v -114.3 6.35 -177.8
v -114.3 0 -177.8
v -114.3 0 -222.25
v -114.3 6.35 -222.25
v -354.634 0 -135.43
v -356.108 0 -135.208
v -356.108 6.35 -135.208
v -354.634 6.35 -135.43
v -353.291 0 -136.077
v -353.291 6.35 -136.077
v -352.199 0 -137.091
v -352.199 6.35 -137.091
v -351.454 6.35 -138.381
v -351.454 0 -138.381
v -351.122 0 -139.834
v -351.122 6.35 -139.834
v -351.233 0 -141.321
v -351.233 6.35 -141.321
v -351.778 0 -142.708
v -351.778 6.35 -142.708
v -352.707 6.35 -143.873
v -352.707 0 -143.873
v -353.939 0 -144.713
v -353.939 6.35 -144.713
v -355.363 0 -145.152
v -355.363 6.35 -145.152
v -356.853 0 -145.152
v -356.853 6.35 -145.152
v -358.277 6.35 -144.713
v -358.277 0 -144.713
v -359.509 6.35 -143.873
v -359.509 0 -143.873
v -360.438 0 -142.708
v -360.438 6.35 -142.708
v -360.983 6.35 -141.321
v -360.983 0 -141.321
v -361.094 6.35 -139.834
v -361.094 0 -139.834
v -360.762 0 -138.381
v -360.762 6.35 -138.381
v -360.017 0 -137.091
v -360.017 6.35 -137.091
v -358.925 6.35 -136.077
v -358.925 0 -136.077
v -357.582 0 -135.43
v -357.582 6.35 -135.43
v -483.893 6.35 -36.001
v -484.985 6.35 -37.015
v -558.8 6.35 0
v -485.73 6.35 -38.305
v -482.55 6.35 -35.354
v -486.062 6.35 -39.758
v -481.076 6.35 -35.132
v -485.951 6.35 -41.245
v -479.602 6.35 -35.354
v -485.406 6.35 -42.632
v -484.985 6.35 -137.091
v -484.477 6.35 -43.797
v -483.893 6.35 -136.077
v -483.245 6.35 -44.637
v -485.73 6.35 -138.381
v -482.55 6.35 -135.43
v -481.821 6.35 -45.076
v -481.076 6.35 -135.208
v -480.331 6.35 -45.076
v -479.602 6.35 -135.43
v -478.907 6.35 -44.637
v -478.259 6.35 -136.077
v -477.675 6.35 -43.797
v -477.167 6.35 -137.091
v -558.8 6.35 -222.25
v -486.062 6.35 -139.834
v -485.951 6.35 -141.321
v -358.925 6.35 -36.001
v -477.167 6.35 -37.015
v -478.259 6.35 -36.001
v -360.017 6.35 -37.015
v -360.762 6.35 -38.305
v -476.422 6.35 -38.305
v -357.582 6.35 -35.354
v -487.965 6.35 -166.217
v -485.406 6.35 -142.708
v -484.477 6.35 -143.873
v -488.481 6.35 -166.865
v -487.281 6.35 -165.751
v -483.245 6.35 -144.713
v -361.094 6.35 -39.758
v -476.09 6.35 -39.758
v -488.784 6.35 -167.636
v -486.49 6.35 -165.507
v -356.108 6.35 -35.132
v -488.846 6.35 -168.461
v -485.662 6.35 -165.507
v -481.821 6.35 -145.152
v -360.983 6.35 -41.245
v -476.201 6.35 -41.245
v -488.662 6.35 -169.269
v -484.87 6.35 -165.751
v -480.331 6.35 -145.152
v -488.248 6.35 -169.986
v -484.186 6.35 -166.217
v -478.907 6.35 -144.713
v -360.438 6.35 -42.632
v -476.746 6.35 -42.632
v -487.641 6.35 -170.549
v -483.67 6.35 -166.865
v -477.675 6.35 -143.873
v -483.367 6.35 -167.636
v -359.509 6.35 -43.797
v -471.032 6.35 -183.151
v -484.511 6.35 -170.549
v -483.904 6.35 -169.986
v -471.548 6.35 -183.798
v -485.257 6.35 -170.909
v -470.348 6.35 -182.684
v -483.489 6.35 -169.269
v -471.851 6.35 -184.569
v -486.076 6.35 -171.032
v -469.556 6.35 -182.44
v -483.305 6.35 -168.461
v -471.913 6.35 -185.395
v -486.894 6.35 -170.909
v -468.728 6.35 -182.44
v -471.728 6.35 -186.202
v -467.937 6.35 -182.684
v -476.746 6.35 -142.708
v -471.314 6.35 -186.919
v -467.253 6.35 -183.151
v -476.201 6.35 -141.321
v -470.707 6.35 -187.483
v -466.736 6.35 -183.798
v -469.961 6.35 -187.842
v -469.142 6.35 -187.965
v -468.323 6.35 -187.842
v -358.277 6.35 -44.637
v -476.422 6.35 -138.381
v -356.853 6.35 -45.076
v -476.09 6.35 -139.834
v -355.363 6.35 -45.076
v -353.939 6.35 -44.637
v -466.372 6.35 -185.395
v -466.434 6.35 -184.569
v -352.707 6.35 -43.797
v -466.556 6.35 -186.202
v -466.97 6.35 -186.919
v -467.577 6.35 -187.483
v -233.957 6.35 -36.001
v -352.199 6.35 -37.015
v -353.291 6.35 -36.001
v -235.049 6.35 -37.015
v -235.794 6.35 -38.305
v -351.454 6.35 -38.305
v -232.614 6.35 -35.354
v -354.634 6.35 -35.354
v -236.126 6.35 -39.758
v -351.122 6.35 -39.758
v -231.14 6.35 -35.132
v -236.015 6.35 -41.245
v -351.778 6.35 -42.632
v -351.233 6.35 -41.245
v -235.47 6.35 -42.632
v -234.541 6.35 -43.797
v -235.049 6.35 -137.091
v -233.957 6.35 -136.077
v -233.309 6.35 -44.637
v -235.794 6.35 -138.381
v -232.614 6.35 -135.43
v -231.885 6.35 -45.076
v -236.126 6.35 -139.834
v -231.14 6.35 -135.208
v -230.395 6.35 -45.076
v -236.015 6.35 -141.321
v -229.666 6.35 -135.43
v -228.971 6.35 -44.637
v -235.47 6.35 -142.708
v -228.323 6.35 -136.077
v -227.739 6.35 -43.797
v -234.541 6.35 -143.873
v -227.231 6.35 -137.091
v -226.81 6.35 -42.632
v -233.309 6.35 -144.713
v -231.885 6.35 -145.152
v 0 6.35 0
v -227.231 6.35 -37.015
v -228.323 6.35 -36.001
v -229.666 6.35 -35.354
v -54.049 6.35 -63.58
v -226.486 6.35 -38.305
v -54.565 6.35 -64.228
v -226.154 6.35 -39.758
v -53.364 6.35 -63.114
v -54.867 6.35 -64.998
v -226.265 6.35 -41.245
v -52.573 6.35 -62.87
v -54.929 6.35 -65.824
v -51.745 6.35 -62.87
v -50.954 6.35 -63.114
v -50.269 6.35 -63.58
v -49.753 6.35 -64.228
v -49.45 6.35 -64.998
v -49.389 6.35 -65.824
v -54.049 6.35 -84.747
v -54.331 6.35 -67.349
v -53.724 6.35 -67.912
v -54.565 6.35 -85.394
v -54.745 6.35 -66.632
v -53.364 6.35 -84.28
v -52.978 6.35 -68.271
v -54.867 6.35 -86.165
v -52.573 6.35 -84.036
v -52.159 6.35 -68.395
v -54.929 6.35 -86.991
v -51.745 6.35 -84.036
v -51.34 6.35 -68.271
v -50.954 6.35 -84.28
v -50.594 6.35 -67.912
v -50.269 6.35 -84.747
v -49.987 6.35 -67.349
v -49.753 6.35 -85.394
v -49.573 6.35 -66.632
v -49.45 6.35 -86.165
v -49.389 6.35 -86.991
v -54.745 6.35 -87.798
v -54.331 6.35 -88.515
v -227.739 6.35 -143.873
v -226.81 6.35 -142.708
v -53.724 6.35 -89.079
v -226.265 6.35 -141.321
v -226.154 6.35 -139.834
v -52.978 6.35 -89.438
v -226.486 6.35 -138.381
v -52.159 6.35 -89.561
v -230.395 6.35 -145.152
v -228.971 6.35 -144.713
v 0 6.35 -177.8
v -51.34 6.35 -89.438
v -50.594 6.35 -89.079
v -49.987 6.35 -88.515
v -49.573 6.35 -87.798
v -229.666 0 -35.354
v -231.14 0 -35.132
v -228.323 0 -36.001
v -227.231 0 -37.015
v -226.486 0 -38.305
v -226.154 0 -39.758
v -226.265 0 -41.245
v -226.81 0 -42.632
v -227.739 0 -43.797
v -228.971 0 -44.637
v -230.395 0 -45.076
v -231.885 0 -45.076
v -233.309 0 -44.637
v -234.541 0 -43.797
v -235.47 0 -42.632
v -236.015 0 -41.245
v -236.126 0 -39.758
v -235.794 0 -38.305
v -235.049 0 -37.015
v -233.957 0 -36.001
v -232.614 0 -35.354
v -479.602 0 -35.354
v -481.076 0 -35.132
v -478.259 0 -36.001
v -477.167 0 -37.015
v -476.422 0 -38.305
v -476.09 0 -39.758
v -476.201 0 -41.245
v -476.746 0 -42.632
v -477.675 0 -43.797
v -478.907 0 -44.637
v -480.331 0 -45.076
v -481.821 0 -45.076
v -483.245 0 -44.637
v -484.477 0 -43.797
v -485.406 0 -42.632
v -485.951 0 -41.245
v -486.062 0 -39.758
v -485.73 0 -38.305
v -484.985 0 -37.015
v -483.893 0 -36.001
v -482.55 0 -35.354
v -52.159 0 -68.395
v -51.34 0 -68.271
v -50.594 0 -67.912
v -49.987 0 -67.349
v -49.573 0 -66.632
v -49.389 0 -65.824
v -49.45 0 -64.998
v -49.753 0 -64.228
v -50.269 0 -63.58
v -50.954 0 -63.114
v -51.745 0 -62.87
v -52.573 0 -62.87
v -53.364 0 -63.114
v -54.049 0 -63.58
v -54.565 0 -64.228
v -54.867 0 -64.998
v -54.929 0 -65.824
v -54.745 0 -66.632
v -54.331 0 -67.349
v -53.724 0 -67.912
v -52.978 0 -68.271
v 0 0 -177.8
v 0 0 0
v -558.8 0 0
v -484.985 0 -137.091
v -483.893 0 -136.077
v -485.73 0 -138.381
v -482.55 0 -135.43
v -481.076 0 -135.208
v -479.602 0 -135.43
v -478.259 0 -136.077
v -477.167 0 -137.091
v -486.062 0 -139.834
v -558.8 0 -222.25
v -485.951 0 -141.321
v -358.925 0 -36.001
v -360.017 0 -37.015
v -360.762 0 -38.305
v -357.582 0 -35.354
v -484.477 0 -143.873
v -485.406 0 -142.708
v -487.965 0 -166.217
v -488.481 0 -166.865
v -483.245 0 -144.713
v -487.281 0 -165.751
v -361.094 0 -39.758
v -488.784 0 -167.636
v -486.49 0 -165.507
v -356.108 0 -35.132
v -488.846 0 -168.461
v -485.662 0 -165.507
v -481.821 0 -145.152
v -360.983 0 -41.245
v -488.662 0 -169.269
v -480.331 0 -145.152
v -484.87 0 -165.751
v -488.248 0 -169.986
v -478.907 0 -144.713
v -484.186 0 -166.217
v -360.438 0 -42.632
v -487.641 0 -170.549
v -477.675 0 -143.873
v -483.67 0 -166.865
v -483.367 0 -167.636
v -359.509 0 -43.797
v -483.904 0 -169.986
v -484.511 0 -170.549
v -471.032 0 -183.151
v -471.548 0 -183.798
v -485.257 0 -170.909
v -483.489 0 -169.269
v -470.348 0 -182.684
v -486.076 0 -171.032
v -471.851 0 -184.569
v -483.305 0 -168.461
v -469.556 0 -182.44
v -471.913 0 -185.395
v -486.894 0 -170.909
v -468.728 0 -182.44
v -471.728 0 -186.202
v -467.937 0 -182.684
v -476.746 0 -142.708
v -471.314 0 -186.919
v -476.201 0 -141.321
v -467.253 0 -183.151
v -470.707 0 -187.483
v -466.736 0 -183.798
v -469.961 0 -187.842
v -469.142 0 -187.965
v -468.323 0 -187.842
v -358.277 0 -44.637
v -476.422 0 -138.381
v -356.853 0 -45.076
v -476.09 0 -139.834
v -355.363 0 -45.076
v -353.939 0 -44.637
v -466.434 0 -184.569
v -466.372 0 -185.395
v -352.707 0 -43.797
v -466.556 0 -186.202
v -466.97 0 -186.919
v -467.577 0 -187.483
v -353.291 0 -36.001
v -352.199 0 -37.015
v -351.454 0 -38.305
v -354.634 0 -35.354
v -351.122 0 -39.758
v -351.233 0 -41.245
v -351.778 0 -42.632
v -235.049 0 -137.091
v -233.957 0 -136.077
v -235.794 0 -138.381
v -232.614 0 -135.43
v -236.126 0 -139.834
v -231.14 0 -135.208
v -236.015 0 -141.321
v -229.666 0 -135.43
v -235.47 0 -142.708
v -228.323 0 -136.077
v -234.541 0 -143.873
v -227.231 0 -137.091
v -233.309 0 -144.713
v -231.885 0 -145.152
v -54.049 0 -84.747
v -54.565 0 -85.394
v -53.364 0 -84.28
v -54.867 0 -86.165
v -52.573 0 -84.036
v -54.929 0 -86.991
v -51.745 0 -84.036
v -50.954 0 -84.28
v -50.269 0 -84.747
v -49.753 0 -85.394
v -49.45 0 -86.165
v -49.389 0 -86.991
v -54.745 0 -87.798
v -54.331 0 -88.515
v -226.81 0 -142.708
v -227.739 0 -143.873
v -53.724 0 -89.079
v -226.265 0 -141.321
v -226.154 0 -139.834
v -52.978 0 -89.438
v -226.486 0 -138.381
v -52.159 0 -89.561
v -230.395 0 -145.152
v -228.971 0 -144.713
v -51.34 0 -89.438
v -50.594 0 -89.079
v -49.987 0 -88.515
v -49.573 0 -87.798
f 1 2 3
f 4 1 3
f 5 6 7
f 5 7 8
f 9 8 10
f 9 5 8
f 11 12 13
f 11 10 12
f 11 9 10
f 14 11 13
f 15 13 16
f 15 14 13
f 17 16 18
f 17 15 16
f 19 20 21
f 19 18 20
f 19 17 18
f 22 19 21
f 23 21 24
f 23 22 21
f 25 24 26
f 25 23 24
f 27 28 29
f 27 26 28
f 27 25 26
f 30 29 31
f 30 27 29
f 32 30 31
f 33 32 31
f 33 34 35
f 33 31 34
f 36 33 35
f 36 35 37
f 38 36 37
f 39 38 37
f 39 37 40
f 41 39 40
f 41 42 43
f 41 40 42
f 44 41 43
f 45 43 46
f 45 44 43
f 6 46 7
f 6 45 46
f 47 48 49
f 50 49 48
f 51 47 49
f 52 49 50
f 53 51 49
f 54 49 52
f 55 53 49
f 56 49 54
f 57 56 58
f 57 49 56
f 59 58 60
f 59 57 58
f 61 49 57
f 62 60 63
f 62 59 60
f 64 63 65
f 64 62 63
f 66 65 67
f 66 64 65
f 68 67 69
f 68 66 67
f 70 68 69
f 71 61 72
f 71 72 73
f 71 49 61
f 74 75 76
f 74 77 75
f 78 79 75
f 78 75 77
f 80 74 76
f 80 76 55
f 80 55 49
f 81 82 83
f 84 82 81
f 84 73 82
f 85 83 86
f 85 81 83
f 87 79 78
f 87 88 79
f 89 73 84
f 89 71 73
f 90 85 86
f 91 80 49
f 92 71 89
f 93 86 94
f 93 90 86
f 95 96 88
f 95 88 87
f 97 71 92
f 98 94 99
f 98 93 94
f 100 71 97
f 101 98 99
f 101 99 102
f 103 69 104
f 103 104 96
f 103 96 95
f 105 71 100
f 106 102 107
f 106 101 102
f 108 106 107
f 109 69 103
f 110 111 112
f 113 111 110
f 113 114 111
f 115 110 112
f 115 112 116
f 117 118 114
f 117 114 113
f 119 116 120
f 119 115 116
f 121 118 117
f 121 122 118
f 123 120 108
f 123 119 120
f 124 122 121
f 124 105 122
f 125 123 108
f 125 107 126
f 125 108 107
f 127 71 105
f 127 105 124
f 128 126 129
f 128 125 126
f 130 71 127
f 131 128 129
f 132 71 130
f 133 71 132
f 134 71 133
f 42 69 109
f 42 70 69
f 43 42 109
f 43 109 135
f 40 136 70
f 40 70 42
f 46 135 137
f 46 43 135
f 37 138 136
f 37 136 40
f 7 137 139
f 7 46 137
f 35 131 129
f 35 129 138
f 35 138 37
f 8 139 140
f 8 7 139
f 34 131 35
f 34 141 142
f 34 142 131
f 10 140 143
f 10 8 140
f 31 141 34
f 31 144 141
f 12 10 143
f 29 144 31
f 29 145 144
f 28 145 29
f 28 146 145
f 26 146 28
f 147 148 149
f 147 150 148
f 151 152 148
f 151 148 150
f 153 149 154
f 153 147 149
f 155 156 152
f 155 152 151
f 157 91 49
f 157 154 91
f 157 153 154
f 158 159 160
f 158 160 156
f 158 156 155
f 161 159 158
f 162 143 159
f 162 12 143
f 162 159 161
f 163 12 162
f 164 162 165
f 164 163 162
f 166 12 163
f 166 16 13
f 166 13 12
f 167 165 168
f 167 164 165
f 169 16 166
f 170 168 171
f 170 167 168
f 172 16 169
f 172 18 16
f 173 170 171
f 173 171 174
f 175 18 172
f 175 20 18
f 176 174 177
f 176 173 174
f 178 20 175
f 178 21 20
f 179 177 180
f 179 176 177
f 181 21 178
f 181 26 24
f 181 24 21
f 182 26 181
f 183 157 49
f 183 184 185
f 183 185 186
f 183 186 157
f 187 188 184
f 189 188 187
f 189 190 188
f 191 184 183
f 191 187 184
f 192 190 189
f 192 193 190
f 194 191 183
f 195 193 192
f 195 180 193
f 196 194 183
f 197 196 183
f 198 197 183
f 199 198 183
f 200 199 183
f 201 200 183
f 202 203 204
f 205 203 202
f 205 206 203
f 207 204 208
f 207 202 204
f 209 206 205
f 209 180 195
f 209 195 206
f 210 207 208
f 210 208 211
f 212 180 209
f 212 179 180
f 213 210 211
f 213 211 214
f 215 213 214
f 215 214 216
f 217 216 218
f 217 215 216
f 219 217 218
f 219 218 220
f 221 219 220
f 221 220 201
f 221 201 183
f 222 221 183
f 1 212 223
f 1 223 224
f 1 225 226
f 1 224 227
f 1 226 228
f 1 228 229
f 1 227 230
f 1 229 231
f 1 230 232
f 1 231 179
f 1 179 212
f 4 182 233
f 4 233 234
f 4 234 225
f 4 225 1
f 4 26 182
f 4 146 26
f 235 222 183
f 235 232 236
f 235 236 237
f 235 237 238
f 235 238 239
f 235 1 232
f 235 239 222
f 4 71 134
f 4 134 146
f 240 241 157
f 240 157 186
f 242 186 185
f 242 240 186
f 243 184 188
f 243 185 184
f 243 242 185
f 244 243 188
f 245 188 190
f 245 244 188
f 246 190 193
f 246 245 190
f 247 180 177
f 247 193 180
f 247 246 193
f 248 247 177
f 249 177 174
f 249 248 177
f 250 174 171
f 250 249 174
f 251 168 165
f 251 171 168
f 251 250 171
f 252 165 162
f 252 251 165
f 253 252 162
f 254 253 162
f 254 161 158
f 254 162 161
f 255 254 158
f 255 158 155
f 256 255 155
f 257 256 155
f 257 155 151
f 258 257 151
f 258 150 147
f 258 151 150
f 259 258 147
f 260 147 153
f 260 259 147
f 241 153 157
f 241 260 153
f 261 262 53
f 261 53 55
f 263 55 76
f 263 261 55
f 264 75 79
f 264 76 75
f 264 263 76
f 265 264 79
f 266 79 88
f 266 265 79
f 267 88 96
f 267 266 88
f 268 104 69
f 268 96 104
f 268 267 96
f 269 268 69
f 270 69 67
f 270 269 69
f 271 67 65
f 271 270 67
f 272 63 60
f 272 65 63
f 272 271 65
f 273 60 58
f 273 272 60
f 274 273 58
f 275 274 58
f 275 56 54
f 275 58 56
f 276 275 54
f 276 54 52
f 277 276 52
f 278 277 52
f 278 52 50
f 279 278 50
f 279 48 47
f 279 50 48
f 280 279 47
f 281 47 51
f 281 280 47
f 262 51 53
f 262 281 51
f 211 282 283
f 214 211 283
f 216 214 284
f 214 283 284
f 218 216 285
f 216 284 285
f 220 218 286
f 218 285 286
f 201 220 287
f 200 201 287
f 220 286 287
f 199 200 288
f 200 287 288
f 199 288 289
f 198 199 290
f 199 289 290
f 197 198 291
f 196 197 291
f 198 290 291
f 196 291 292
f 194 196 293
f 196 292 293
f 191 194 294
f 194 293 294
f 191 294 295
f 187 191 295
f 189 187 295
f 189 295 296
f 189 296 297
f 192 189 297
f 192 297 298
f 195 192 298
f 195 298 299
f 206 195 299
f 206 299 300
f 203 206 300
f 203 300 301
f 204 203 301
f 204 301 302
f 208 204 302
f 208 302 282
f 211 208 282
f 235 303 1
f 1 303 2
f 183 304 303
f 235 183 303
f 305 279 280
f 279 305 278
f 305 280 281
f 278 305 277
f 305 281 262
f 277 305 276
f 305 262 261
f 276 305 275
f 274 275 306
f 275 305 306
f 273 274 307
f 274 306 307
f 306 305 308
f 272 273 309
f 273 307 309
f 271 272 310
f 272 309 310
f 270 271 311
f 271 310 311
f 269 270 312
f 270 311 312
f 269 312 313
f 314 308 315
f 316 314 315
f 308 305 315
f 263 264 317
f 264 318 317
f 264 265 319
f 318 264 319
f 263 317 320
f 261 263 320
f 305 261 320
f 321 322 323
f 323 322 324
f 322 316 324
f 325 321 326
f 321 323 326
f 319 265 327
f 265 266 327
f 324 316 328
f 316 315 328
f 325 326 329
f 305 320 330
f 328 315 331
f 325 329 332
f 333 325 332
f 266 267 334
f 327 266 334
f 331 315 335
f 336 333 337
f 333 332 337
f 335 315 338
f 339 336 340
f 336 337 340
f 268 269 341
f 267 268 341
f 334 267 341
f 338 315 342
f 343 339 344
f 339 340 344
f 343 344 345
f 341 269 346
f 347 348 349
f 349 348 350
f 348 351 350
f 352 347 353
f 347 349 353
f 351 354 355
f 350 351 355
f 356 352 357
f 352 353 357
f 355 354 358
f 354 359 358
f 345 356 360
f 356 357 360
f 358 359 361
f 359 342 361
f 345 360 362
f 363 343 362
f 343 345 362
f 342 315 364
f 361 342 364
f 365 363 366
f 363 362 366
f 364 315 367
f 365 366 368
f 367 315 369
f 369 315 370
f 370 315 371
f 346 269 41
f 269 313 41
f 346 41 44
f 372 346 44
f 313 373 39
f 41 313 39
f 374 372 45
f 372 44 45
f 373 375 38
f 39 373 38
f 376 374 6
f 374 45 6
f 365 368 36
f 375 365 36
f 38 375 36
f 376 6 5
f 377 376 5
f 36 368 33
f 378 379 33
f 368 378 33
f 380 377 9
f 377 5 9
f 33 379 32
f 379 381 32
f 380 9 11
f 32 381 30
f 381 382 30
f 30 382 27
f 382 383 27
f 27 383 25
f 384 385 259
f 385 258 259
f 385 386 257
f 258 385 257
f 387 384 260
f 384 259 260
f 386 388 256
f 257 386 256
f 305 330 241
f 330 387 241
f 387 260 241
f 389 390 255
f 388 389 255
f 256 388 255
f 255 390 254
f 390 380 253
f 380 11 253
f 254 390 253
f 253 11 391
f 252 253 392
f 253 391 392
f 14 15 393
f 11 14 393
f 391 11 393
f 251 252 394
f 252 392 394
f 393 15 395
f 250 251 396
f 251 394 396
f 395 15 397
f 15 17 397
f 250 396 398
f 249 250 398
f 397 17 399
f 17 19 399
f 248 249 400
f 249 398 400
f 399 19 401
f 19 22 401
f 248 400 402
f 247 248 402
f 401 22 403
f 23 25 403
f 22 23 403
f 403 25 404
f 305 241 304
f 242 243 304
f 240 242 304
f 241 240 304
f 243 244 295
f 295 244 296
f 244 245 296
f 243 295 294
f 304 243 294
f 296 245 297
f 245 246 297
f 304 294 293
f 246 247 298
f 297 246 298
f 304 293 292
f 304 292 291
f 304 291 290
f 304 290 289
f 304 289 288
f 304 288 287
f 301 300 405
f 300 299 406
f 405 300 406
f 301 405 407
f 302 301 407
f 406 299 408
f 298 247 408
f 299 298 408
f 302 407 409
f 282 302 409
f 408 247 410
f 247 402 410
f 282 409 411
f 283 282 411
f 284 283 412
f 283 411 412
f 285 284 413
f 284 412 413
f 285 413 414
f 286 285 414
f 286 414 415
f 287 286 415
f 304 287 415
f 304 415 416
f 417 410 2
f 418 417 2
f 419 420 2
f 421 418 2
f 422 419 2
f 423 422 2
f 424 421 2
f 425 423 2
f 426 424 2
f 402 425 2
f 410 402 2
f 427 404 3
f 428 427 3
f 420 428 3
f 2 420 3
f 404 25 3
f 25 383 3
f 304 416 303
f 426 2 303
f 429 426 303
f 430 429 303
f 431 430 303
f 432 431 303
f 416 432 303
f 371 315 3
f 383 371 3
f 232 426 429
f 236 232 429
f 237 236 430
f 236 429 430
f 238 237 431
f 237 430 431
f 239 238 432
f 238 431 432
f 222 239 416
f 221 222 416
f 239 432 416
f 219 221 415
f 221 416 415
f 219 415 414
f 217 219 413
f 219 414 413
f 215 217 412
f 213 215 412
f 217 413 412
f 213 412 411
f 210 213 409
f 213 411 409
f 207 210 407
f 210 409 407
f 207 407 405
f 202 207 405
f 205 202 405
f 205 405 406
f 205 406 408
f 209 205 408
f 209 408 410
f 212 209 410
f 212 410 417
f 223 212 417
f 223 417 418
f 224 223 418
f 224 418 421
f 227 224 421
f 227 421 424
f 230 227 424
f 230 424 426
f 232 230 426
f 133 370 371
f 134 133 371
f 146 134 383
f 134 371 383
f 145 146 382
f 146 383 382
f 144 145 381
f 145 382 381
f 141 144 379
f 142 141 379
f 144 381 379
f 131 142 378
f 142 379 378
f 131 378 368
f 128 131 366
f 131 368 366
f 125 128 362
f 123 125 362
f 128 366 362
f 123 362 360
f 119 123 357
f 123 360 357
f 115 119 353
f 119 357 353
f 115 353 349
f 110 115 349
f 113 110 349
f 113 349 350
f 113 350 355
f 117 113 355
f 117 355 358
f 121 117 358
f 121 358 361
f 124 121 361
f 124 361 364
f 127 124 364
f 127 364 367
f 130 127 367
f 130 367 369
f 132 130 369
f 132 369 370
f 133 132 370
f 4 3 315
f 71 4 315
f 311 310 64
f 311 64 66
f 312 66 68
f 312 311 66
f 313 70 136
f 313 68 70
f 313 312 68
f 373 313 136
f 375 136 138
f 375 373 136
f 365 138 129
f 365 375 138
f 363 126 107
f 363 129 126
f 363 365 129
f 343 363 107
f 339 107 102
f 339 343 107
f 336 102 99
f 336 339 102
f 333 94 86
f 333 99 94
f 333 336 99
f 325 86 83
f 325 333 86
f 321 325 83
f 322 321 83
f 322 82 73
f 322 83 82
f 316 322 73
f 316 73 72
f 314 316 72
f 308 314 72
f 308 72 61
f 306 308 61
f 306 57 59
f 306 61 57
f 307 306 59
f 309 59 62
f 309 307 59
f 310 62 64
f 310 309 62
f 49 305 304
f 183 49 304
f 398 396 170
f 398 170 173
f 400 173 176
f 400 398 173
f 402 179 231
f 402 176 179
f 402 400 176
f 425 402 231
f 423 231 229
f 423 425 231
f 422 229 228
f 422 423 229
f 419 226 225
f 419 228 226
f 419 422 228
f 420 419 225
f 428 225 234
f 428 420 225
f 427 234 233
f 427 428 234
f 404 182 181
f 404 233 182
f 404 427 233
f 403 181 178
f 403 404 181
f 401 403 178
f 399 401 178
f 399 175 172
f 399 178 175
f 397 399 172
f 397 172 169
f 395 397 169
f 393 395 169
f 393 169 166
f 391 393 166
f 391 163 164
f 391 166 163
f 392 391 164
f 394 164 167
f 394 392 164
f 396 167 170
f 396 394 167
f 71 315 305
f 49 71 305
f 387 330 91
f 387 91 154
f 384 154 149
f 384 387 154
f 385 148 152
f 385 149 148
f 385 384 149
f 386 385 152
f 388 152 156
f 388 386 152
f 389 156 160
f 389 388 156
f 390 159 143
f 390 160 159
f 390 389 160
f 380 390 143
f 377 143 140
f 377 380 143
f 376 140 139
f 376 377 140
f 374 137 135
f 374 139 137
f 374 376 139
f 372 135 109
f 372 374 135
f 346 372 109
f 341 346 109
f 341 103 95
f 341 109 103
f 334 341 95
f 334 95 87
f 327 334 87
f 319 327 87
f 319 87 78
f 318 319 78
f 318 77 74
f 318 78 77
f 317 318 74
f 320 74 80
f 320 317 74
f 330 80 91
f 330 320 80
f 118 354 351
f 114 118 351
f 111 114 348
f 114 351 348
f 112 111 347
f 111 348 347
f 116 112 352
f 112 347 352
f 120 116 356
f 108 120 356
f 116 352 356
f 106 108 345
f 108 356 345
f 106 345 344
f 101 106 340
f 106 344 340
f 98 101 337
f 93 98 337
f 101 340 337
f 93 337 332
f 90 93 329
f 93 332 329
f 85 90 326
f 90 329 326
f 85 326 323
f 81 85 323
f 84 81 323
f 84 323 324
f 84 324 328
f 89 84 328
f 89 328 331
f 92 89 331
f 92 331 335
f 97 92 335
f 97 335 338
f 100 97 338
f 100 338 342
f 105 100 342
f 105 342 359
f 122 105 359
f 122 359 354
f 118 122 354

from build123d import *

# Parameters (mm, degrees)
BOSS_EXTRUDE1_DEPTH     = 6.35
CUT_EXTRUDE3_DEPTH      = 602.409033022
CUT_EXTRUDE3_DEPTH_BACK = 602.409033022
SKETCH10_R              = 5.0000027
SKETCH2_R               = 2.778125
CUT_EXTRUDE4_DEPTH      = 602.409033022


with BuildPart() as part:
    # Sketch1 → Boss-Extrude1 (new body)
    with BuildSketch(Plane(origin=(0, 0, 0), x_dir=(1, 0, 0), z_dir=(0, 1, 0))):
        Polygon((0, 0), (0, 177.8), (-114.3, 177.8), (-114.3, 222.25), (-558.8, 222.25), (-558.8, 0), align=None)
    extrude(amount=BOSS_EXTRUDE1_DEPTH)

    # Sketch10 → Cut-Extrude3 (cut, two sides: drawn at the far end of the back side and taken through both)
    with BuildSketch(Plane(origin=(0, 6.35, 0), x_dir=(1, 0, 0), z_dir=(0, 1, 0)).offset(-CUT_EXTRUDE3_DEPTH_BACK)):
        with Locations(Location((-481.076, 40.132, 0), (0, 0, 270))):
            Circle(SKETCH10_R)
        with Locations(Location((-356.108, 40.132, 0), (0, 0, 270))):
            Circle(SKETCH10_R)
        with Locations(Location((-231.14, 40.132, 0), (0, 0, 270))):
            Circle(SKETCH10_R)
        with Locations(Location((-356.108, 140.208, 0), (0, 0, 270))):
            Circle(SKETCH10_R)
        with Locations(Location((-231.14, 140.208, 0), (0, 0, 270))):
            Circle(SKETCH10_R)
        with Locations(Location((-481.076, 140.208, 0), (0, 0, 270))):
            Circle(SKETCH10_R)
    extrude(amount=CUT_EXTRUDE3_DEPTH + CUT_EXTRUDE3_DEPTH_BACK, mode=Mode.SUBTRACT)

    # Sketch2 → Cut-Extrude4 (cut, through all)
    with BuildSketch(Plane.XZ):
        with Locations(Location((-52.1589, -86.783333333, 0), (0, 0, 270))):
            Circle(SKETCH2_R)
        with Locations(Location((-52.1589, -65.616666667, 0), (0, 0, 270))):
            Circle(SKETCH2_R)
        with Locations(Location((-469.142233333, -185.187166667, 0), (0, 0, 270))):
            Circle(SKETCH2_R)
        with Locations(Location((-486.075566667, -168.253833333, 0), (0, 0, 270))):
            Circle(SKETCH2_R)
    extrude(amount=-CUT_EXTRUDE4_DEPTH, mode=Mode.SUBTRACT)


solid = part.part
